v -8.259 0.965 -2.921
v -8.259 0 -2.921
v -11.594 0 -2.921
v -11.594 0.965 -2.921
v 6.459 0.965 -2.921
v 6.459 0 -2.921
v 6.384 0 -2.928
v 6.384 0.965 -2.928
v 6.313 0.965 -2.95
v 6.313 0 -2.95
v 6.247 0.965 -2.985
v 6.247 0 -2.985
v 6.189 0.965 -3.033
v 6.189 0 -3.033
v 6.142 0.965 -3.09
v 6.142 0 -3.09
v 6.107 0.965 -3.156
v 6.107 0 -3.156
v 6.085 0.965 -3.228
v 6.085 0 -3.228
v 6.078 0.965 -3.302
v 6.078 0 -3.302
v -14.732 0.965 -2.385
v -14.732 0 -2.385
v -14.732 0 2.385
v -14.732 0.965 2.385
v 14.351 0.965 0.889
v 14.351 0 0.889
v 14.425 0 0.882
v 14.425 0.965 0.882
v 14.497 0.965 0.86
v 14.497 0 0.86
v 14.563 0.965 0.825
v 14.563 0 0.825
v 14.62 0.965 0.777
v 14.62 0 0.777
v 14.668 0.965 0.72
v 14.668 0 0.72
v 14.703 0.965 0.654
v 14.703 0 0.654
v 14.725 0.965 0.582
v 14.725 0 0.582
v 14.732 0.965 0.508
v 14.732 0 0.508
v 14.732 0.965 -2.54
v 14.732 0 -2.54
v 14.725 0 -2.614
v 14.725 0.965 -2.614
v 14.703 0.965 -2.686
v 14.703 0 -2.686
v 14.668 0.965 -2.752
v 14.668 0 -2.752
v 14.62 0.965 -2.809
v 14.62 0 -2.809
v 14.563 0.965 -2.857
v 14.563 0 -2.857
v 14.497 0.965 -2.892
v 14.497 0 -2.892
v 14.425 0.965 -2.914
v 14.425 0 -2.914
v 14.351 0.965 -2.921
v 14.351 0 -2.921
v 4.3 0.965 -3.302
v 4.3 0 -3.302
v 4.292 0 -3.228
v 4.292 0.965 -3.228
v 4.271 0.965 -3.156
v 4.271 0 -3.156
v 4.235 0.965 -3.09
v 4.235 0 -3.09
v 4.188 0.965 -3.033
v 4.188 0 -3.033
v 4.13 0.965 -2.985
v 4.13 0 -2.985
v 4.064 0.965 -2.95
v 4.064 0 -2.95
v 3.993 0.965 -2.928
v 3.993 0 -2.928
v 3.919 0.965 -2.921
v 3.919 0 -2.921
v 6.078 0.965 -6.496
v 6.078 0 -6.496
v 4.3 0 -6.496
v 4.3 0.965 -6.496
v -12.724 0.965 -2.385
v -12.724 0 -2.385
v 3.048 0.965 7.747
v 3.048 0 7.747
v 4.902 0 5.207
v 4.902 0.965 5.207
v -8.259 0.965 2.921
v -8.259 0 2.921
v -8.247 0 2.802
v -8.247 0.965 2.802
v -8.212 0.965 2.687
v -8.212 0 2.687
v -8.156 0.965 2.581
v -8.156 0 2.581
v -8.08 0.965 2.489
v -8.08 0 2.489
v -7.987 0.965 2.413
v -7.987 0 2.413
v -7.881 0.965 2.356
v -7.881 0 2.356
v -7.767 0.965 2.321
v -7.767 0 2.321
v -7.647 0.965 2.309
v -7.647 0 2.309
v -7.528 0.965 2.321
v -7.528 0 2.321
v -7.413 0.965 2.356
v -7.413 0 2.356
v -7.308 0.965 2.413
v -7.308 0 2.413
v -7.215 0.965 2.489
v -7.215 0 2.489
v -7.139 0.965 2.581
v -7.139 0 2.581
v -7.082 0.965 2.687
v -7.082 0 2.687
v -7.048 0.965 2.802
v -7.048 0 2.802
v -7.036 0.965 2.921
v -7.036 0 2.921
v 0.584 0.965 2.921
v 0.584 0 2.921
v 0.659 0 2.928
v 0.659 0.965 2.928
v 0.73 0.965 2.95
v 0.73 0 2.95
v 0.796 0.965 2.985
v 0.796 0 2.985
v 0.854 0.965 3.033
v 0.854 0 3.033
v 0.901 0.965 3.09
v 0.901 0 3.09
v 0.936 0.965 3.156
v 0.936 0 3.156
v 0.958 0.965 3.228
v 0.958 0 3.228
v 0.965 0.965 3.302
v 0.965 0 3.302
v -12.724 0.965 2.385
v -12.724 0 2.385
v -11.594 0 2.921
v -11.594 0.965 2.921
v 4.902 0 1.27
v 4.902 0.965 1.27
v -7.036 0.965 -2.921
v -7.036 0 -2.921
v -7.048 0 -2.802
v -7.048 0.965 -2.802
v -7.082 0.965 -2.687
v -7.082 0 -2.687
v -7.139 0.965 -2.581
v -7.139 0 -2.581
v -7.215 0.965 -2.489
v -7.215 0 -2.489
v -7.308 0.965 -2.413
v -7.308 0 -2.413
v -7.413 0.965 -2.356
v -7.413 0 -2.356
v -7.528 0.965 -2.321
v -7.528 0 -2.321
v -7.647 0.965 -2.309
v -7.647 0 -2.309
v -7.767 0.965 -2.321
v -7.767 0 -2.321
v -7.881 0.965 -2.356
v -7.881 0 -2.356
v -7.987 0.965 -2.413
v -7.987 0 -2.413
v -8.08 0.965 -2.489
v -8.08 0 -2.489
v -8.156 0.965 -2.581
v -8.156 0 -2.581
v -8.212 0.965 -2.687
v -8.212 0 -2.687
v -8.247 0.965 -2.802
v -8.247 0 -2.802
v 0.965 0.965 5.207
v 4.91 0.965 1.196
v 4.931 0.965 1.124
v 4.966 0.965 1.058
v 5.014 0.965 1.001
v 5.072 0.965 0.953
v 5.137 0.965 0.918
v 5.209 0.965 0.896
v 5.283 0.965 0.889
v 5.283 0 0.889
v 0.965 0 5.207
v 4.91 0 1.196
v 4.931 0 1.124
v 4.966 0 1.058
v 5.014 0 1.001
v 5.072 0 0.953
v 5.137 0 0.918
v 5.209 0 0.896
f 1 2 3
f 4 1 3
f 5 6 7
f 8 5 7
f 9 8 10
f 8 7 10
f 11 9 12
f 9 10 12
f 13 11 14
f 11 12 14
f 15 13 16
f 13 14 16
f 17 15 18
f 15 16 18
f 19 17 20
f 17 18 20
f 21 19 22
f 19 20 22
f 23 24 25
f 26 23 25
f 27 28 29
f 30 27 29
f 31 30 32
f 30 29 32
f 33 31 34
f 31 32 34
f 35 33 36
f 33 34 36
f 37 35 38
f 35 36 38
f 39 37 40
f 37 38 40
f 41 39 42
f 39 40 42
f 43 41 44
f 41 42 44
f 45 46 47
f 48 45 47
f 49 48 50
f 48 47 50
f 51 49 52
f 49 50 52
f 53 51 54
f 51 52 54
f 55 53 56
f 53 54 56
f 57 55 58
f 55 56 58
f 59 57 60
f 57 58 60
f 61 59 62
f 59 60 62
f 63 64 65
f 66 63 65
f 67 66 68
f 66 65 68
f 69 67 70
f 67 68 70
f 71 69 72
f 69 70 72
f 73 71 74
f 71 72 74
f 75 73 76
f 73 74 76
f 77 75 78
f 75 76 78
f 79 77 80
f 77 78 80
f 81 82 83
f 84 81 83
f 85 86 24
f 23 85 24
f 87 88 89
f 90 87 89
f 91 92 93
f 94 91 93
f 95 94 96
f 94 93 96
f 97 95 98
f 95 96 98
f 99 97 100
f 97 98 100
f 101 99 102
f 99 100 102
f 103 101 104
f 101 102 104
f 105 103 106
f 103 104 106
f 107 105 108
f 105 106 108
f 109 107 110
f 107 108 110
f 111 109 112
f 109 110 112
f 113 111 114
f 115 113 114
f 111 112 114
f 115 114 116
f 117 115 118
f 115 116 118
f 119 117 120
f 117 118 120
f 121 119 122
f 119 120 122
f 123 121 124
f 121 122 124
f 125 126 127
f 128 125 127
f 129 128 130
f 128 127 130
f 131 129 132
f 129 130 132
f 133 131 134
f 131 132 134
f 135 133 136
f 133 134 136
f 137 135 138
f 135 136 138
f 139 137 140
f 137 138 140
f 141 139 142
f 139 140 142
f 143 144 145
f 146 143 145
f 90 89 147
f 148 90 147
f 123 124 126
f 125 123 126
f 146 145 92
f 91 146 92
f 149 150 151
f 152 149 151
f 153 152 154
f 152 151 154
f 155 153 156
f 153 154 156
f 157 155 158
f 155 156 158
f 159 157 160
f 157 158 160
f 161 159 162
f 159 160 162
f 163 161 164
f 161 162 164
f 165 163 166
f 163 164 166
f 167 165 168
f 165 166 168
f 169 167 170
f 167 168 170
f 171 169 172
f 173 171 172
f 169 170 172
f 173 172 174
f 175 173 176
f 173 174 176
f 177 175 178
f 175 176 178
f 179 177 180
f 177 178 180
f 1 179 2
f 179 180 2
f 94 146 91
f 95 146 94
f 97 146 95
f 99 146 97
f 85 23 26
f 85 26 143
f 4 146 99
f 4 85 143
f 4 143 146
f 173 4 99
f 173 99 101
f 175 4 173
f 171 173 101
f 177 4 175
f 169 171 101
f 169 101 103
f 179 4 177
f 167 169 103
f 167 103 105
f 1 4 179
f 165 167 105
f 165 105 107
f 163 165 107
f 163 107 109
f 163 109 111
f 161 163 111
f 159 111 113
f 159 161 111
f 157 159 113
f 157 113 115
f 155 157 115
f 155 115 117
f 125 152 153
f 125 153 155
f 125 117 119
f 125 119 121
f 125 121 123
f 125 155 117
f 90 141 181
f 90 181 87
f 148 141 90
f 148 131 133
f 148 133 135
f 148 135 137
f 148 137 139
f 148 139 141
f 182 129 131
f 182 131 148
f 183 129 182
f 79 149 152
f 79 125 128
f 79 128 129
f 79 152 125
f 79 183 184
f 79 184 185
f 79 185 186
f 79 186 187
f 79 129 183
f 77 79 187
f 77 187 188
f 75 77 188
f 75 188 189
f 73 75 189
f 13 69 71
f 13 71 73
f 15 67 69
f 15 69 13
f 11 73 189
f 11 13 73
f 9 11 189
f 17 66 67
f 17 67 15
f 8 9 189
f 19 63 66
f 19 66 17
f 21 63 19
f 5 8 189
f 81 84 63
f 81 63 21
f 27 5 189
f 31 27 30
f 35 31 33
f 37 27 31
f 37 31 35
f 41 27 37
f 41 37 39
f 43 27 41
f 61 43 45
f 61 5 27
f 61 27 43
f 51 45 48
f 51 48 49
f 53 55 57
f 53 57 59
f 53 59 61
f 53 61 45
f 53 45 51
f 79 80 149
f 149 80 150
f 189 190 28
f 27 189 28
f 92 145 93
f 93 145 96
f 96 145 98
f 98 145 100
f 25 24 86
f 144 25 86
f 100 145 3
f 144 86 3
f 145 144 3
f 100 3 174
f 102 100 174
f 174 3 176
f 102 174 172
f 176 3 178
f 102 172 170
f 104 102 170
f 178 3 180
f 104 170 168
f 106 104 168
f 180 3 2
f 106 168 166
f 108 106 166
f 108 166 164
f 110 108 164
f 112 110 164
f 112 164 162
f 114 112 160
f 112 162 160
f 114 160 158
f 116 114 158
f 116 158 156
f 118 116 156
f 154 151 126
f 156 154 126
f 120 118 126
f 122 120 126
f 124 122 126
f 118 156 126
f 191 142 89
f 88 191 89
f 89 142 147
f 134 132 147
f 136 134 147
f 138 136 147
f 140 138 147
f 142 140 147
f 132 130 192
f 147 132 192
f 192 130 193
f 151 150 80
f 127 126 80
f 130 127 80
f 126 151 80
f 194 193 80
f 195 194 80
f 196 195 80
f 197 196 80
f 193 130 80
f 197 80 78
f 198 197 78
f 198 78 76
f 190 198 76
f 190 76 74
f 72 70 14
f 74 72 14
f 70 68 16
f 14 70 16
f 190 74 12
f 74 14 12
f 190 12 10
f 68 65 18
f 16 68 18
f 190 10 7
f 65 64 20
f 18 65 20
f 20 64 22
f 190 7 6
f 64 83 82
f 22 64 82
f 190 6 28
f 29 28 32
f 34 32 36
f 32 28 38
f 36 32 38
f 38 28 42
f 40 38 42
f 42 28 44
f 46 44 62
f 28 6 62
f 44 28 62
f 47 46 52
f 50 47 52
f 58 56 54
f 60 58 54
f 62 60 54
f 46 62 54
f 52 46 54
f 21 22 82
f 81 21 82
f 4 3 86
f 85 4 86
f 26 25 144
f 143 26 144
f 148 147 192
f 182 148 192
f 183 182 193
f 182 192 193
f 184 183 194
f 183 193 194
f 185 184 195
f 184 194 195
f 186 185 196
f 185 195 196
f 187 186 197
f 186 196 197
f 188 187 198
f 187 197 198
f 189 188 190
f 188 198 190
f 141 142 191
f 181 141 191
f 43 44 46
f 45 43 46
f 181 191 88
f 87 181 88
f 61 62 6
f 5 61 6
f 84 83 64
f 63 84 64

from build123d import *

# Parameters (mm, degrees)
BOSS_EXTRUDE1_DEPTH = 0.9652


with BuildPart() as part:
    # Sketch2 → Boss-Extrude1 (new body)
    with BuildSketch(Plane(origin=(0, 0, 0), x_dir=(1, 0, 0), z_dir=(0, 1, 0))):
        with BuildLine():
            Line((14.732, -0.508), (14.732, 2.54))
            ThreePointArc((14.732, 2.54), (14.620407684, 2.809407684), (14.351, 2.921))
            Line((14.351, 2.921), (6.458532376, 2.921))
            ThreePointArc((6.458532376, 2.921), (6.189124692, 3.032592316), (6.077532376, 3.302))
            Line((6.077532376, 3.302), (6.077532376, 6.495707179))
            Line((6.077532376, 6.495707179), (4.299532376, 6.495707179))
            Line((4.299532376, 6.495707179), (4.299532376, 3.302))
            ThreePointArc((4.299532376, 3.302), (4.187940059, 3.032592316), (3.918532376, 2.921))
            Line((3.918532376, 2.921), (0.5842, 2.921))
            Line((0.5842, 2.921), (-7.0358, 2.921))
            ThreePointArc((-7.0358, 2.921), (-7.647331795, 2.309468205), (-8.258863591, 2.921))
            Line((-8.258863591, 2.921), (-11.594310971, 2.921))
            Line((-11.594310971, 2.921), (-12.723617207, 2.385330376))
            Line((-12.723617207, 2.385330376), (-14.732, 2.385330376))
            Line((-14.732, 2.385330376), (-14.732, -2.385330376))
            Line((-14.732, -2.385330376), (-12.723617207, -2.385330376))
            Line((-12.723617207, -2.385330376), (-11.594310971, -2.921))
            Line((-11.594310971, -2.921), (-8.258863591, -2.921))
            ThreePointArc((-8.258863591, -2.921), (-7.647331795, -2.309468205), (-7.0358, -2.921))
            Line((-7.0358, -2.921), (0.5842, -2.921))
            ThreePointArc((0.5842, -2.921), (0.853607684, -3.032592316), (0.9652, -3.302))
            Line((0.9652, -3.302), (0.9652, -5.207))
            Line((0.9652, -5.207), (3.048, -7.747))
            Line((3.048, -7.747), (4.9022, -5.207))
            Line((4.9022, -5.207), (4.9022, -2.921))
            Line((4.9022, -2.921), (4.9022, -1.27))
            ThreePointArc((4.9022, -1.27), (5.013792316, -1.000592316), (5.2832, -0.889))
            Line((5.2832, -0.889), (14.351, -0.889))
            ThreePointArc((14.351, -0.889), (14.620407684, -0.777407684), (14.732, -0.508))
        make_face()
    extrude(amount=BOSS_EXTRUDE1_DEPTH)


solid = part.part
